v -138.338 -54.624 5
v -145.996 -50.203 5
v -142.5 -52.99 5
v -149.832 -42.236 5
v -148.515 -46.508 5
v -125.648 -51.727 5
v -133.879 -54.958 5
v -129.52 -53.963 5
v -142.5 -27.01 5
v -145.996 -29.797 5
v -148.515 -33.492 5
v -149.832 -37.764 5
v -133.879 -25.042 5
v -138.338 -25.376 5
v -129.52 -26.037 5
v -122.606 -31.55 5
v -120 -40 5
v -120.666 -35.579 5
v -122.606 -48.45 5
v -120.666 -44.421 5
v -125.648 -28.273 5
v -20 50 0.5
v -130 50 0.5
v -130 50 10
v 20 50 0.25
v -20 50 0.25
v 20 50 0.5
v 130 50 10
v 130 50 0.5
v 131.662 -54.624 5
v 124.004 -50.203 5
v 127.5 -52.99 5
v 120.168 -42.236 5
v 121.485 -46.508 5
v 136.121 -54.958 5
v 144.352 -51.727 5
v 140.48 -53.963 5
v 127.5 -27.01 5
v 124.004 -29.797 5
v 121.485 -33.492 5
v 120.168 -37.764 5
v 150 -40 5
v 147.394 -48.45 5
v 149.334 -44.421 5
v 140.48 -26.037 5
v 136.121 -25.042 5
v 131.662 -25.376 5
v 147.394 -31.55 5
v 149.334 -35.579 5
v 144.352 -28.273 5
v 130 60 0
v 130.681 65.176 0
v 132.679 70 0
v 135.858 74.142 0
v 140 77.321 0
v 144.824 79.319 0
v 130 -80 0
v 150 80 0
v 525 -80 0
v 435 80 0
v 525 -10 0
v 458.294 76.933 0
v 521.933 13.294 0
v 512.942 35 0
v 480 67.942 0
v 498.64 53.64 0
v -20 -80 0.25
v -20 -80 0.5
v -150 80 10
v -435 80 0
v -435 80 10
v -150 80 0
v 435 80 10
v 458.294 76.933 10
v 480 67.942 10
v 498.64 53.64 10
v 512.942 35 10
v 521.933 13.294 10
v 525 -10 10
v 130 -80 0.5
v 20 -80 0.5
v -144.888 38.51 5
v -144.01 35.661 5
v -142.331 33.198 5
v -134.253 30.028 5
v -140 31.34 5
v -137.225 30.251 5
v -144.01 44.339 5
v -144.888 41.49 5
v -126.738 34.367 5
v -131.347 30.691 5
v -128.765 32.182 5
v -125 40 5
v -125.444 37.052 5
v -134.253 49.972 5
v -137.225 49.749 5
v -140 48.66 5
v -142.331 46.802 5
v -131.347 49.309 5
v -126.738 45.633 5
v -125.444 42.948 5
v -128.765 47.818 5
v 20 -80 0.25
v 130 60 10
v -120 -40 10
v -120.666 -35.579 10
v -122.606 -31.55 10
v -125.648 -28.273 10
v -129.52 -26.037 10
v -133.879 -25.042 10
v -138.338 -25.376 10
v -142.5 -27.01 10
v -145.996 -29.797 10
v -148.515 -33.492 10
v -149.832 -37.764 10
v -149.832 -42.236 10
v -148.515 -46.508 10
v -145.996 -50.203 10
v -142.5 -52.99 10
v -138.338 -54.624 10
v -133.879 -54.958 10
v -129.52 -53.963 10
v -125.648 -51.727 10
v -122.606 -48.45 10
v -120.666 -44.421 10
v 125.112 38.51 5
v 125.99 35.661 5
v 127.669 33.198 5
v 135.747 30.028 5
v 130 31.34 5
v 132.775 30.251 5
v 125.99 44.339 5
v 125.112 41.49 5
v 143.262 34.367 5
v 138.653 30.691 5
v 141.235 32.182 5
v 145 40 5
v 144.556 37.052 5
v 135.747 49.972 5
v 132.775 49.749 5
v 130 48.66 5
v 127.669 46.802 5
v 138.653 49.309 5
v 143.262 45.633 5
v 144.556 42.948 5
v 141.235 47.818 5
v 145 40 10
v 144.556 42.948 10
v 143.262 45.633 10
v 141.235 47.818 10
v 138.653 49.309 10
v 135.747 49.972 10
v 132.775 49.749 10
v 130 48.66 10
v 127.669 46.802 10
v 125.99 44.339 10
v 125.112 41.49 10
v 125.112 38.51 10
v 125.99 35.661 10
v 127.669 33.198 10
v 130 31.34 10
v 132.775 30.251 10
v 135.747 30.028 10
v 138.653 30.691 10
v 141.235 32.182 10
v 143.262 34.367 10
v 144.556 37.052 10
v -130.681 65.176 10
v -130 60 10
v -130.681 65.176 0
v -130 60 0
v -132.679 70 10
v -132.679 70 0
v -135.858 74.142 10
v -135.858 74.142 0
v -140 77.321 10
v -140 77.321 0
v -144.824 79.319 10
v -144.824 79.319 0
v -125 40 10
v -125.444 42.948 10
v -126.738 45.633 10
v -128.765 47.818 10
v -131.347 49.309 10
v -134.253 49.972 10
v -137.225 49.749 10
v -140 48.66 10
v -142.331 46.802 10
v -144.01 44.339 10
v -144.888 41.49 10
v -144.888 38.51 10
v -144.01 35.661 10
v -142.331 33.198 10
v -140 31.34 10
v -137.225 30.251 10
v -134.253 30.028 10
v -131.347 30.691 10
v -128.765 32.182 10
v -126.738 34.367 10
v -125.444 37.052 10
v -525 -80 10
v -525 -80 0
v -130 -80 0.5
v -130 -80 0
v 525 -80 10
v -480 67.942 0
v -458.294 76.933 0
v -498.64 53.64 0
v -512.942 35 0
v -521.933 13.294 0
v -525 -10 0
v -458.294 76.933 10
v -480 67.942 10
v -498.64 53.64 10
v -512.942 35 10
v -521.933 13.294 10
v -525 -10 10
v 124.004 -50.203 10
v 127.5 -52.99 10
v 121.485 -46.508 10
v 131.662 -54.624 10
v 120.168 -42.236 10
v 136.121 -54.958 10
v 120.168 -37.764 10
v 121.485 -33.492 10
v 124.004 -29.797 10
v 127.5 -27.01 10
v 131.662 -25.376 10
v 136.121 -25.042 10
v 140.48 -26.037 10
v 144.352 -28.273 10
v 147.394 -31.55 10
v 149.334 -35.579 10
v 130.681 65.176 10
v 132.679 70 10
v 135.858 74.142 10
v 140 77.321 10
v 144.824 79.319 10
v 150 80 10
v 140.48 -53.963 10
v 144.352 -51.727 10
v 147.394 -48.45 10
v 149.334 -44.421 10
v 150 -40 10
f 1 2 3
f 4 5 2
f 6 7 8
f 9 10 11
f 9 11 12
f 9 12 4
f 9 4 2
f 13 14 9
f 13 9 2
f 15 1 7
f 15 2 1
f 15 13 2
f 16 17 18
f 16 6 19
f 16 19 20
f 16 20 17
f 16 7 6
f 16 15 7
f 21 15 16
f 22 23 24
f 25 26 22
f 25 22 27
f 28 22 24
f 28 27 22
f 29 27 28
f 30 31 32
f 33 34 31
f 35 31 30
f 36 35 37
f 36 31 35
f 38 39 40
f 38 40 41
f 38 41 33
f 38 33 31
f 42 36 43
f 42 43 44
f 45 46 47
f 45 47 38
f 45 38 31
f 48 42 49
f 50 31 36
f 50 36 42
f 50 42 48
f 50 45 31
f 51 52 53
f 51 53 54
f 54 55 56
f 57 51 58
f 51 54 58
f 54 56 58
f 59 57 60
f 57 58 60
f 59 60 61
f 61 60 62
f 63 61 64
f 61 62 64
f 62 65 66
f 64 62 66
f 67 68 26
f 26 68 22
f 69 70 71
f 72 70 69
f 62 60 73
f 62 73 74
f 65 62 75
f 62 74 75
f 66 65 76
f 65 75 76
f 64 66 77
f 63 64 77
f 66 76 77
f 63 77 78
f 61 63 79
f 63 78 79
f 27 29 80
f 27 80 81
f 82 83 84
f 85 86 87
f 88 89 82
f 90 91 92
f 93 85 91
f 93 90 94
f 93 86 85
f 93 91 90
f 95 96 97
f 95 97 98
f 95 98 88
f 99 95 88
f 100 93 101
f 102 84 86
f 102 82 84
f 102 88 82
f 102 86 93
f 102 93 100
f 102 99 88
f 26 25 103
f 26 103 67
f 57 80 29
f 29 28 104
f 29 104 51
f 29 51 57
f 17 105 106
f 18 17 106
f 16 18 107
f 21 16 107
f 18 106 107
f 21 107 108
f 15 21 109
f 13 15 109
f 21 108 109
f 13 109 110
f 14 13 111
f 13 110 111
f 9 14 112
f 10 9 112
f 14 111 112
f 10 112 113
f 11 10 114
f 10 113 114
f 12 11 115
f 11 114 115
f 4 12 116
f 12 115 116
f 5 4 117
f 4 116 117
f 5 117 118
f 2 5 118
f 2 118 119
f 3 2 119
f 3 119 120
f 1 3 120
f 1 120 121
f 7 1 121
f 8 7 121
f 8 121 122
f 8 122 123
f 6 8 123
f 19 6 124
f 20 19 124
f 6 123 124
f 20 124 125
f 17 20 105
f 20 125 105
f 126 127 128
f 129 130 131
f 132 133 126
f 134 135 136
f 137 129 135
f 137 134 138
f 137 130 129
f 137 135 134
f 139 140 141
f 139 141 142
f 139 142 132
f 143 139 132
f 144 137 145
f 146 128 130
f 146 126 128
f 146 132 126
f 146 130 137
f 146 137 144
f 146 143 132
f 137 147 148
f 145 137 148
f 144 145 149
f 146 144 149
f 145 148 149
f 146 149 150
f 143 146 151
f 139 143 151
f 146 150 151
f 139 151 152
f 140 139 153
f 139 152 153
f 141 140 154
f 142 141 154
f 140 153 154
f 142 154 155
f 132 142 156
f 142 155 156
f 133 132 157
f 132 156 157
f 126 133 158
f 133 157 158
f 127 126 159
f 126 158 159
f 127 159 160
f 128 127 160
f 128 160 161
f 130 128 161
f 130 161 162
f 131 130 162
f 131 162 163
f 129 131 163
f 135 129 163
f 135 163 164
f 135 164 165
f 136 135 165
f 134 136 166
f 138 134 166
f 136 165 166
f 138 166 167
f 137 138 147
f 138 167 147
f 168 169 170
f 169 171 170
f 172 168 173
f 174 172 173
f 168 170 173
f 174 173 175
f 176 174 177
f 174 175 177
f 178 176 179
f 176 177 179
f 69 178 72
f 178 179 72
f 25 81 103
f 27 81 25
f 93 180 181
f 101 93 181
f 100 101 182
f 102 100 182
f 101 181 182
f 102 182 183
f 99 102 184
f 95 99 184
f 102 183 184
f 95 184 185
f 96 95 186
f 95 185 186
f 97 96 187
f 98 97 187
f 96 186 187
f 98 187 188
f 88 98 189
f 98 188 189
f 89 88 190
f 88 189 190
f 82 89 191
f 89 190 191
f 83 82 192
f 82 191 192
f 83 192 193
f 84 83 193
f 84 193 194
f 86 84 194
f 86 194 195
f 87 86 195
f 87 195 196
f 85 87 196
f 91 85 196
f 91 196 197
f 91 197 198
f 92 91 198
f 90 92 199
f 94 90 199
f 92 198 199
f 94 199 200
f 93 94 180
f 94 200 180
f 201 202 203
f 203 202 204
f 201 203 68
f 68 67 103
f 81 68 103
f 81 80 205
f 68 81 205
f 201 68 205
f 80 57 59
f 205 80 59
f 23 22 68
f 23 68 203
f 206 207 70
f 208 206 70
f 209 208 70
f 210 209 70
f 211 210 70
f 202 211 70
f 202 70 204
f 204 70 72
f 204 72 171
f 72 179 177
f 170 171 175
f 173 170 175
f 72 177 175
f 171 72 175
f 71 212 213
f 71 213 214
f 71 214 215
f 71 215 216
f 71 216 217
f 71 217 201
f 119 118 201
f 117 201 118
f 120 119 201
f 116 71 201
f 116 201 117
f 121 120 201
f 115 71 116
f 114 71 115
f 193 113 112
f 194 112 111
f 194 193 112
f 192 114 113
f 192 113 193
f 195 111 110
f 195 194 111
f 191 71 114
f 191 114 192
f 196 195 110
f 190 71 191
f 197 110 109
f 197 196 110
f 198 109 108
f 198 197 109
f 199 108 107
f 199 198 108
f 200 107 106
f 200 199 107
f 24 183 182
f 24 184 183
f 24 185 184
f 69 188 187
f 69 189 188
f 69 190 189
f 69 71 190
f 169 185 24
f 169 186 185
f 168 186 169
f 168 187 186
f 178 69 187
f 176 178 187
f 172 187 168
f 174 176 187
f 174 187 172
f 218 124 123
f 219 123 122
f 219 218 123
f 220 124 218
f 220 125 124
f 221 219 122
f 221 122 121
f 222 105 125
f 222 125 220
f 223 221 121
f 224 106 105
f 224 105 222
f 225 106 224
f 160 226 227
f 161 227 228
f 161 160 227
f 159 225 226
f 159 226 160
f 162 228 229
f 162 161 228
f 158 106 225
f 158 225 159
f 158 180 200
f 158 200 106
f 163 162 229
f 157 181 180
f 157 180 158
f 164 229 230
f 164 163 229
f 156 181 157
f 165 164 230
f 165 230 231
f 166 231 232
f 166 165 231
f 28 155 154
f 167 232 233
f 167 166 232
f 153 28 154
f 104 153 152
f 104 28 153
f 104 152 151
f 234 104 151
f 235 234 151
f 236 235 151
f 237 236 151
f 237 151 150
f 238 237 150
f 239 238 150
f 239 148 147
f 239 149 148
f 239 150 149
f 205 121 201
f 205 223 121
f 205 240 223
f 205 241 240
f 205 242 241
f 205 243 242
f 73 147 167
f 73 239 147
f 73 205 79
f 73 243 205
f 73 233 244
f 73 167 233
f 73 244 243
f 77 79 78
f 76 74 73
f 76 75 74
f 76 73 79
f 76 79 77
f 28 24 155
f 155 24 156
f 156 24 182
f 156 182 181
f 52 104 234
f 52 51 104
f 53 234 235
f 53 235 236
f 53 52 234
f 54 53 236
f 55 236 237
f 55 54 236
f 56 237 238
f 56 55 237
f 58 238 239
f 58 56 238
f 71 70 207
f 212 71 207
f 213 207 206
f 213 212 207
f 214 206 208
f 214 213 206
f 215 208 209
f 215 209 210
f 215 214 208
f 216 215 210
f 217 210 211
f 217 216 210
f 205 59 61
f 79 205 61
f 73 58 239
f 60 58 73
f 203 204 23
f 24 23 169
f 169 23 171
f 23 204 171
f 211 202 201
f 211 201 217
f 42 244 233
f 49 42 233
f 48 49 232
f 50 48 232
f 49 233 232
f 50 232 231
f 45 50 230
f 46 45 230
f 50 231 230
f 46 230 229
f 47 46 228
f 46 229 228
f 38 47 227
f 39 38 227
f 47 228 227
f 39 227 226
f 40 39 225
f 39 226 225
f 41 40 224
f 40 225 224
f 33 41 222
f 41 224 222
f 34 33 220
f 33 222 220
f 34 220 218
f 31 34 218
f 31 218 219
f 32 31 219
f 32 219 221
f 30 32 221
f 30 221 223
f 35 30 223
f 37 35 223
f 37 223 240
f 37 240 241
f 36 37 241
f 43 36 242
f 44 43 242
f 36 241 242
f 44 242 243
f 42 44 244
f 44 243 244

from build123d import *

# Parameters (mm, degrees)
SKETCH1_W           = 1050
SKETCH1_H           = 160
BOSS_EXTRUDE1_DEPTH = 10
SKETCH2_R           = 10
SKETCH2_R_2         = 15
CUT_EXTRUDE3_DEPTH  = 5
FILLET1_R           = 90
FILLET2_R           = 90
SKETCH3_W           = 260
SKETCH3_H           = 160
CUT_EXTRUDE4_DEPTH  = 0.5
SKETCH4_W           = 40
SKETCH4_H           = 160
BOSS_EXTRUDE2_DEPTH = 0.25
SKETCH5_W           = 260
SKETCH5_H           = 9.5
CUT_EXTRUDE5_DEPTH  = 30
SKETCH6_W           = 40
SKETCH6_H           = 30
CUT_EXTRUDE7_DEPTH  = 30
FILLET3_R           = 20
FILLET4_R           = 20


with BuildPart() as part:
    # Sketch1 → Boss-Extrude1 (new body)
    with BuildSketch(Plane.XY):
        Rectangle(SKETCH1_W, SKETCH1_H)
    extrude(amount=BOSS_EXTRUDE1_DEPTH)

    # Sketch2 → Cut-Extrude3 (cut)
    with BuildSketch(Plane.XY.offset(10)):
        with Locations((-135, 40)):
            Circle(SKETCH2_R)
        with Locations((135, 40)):
            Circle(SKETCH2_R)
        with Locations((135, -40)):
            Circle(SKETCH2_R_2)
        with Locations((-135, -40)):
            Circle(SKETCH2_R_2)
    extrude(amount=-CUT_EXTRUDE3_DEPTH, mode=Mode.SUBTRACT)

    # Fillet1
    fillet1_edges = [part.edges().sort_by_distance(p)[0] for p in [
        (525, 80, 5),
    ]]
    fillet(fillet1_edges, radius=FILLET1_R)

    # Fillet2
    fillet2_edges = [part.edges().sort_by_distance(p)[0] for p in [
        (-525, 80, 5),
    ]]
    fillet(fillet2_edges, radius=FILLET2_R)

    # Sketch3 → Cut-Extrude4 (cut)
    with BuildSketch(Plane(origin=(0, 0, 0), x_dir=(-1, 0, 0), z_dir=(0, 0, -1))):
        Rectangle(SKETCH3_W, SKETCH3_H)
    extrude(amount=-CUT_EXTRUDE4_DEPTH, mode=Mode.SUBTRACT)

    # Sketch4 → Boss-Extrude2 (add)
    with BuildSketch(Plane(origin=(0, 0, 0.5), x_dir=(-1, 0, 0), z_dir=(0, 0, -1))):
        Rectangle(SKETCH4_W, SKETCH4_H)
    extrude(amount=BOSS_EXTRUDE2_DEPTH)

    # Sketch5 → Cut-Extrude5 (cut)
    with BuildSketch(Plane(origin=(0, 80, 0), x_dir=(1, 0, 0), z_dir=(0, 1, 0))):
        with Locations((0, -5.25)):
            Rectangle(SKETCH5_W, SKETCH5_H)
    extrude(amount=-CUT_EXTRUDE5_DEPTH, mode=Mode.SUBTRACT)

    # Sketch6 → Cut-Extrude7 (cut)
    with BuildSketch(Plane(origin=(0, 0, 0.25), x_dir=(-1, 0, 0), z_dir=(0, 0, -1))):
        with Locations((0, 65)):
            Rectangle(SKETCH6_W, SKETCH6_H)
    extrude(amount=-CUT_EXTRUDE7_DEPTH, mode=Mode.SUBTRACT)

    # Fillet3
    fillet3_edges = [part.edges().sort_by_distance(p)[0] for p in [
        (130, 80, 5),
    ]]
    fillet(fillet3_edges, radius=FILLET3_R)

    # Fillet4
    fillet4_edges = [part.edges().sort_by_distance(p)[0] for p in [
        (-130, 80, 5),
    ]]
    fillet(fillet4_edges, radius=FILLET4_R)


solid = part.part
